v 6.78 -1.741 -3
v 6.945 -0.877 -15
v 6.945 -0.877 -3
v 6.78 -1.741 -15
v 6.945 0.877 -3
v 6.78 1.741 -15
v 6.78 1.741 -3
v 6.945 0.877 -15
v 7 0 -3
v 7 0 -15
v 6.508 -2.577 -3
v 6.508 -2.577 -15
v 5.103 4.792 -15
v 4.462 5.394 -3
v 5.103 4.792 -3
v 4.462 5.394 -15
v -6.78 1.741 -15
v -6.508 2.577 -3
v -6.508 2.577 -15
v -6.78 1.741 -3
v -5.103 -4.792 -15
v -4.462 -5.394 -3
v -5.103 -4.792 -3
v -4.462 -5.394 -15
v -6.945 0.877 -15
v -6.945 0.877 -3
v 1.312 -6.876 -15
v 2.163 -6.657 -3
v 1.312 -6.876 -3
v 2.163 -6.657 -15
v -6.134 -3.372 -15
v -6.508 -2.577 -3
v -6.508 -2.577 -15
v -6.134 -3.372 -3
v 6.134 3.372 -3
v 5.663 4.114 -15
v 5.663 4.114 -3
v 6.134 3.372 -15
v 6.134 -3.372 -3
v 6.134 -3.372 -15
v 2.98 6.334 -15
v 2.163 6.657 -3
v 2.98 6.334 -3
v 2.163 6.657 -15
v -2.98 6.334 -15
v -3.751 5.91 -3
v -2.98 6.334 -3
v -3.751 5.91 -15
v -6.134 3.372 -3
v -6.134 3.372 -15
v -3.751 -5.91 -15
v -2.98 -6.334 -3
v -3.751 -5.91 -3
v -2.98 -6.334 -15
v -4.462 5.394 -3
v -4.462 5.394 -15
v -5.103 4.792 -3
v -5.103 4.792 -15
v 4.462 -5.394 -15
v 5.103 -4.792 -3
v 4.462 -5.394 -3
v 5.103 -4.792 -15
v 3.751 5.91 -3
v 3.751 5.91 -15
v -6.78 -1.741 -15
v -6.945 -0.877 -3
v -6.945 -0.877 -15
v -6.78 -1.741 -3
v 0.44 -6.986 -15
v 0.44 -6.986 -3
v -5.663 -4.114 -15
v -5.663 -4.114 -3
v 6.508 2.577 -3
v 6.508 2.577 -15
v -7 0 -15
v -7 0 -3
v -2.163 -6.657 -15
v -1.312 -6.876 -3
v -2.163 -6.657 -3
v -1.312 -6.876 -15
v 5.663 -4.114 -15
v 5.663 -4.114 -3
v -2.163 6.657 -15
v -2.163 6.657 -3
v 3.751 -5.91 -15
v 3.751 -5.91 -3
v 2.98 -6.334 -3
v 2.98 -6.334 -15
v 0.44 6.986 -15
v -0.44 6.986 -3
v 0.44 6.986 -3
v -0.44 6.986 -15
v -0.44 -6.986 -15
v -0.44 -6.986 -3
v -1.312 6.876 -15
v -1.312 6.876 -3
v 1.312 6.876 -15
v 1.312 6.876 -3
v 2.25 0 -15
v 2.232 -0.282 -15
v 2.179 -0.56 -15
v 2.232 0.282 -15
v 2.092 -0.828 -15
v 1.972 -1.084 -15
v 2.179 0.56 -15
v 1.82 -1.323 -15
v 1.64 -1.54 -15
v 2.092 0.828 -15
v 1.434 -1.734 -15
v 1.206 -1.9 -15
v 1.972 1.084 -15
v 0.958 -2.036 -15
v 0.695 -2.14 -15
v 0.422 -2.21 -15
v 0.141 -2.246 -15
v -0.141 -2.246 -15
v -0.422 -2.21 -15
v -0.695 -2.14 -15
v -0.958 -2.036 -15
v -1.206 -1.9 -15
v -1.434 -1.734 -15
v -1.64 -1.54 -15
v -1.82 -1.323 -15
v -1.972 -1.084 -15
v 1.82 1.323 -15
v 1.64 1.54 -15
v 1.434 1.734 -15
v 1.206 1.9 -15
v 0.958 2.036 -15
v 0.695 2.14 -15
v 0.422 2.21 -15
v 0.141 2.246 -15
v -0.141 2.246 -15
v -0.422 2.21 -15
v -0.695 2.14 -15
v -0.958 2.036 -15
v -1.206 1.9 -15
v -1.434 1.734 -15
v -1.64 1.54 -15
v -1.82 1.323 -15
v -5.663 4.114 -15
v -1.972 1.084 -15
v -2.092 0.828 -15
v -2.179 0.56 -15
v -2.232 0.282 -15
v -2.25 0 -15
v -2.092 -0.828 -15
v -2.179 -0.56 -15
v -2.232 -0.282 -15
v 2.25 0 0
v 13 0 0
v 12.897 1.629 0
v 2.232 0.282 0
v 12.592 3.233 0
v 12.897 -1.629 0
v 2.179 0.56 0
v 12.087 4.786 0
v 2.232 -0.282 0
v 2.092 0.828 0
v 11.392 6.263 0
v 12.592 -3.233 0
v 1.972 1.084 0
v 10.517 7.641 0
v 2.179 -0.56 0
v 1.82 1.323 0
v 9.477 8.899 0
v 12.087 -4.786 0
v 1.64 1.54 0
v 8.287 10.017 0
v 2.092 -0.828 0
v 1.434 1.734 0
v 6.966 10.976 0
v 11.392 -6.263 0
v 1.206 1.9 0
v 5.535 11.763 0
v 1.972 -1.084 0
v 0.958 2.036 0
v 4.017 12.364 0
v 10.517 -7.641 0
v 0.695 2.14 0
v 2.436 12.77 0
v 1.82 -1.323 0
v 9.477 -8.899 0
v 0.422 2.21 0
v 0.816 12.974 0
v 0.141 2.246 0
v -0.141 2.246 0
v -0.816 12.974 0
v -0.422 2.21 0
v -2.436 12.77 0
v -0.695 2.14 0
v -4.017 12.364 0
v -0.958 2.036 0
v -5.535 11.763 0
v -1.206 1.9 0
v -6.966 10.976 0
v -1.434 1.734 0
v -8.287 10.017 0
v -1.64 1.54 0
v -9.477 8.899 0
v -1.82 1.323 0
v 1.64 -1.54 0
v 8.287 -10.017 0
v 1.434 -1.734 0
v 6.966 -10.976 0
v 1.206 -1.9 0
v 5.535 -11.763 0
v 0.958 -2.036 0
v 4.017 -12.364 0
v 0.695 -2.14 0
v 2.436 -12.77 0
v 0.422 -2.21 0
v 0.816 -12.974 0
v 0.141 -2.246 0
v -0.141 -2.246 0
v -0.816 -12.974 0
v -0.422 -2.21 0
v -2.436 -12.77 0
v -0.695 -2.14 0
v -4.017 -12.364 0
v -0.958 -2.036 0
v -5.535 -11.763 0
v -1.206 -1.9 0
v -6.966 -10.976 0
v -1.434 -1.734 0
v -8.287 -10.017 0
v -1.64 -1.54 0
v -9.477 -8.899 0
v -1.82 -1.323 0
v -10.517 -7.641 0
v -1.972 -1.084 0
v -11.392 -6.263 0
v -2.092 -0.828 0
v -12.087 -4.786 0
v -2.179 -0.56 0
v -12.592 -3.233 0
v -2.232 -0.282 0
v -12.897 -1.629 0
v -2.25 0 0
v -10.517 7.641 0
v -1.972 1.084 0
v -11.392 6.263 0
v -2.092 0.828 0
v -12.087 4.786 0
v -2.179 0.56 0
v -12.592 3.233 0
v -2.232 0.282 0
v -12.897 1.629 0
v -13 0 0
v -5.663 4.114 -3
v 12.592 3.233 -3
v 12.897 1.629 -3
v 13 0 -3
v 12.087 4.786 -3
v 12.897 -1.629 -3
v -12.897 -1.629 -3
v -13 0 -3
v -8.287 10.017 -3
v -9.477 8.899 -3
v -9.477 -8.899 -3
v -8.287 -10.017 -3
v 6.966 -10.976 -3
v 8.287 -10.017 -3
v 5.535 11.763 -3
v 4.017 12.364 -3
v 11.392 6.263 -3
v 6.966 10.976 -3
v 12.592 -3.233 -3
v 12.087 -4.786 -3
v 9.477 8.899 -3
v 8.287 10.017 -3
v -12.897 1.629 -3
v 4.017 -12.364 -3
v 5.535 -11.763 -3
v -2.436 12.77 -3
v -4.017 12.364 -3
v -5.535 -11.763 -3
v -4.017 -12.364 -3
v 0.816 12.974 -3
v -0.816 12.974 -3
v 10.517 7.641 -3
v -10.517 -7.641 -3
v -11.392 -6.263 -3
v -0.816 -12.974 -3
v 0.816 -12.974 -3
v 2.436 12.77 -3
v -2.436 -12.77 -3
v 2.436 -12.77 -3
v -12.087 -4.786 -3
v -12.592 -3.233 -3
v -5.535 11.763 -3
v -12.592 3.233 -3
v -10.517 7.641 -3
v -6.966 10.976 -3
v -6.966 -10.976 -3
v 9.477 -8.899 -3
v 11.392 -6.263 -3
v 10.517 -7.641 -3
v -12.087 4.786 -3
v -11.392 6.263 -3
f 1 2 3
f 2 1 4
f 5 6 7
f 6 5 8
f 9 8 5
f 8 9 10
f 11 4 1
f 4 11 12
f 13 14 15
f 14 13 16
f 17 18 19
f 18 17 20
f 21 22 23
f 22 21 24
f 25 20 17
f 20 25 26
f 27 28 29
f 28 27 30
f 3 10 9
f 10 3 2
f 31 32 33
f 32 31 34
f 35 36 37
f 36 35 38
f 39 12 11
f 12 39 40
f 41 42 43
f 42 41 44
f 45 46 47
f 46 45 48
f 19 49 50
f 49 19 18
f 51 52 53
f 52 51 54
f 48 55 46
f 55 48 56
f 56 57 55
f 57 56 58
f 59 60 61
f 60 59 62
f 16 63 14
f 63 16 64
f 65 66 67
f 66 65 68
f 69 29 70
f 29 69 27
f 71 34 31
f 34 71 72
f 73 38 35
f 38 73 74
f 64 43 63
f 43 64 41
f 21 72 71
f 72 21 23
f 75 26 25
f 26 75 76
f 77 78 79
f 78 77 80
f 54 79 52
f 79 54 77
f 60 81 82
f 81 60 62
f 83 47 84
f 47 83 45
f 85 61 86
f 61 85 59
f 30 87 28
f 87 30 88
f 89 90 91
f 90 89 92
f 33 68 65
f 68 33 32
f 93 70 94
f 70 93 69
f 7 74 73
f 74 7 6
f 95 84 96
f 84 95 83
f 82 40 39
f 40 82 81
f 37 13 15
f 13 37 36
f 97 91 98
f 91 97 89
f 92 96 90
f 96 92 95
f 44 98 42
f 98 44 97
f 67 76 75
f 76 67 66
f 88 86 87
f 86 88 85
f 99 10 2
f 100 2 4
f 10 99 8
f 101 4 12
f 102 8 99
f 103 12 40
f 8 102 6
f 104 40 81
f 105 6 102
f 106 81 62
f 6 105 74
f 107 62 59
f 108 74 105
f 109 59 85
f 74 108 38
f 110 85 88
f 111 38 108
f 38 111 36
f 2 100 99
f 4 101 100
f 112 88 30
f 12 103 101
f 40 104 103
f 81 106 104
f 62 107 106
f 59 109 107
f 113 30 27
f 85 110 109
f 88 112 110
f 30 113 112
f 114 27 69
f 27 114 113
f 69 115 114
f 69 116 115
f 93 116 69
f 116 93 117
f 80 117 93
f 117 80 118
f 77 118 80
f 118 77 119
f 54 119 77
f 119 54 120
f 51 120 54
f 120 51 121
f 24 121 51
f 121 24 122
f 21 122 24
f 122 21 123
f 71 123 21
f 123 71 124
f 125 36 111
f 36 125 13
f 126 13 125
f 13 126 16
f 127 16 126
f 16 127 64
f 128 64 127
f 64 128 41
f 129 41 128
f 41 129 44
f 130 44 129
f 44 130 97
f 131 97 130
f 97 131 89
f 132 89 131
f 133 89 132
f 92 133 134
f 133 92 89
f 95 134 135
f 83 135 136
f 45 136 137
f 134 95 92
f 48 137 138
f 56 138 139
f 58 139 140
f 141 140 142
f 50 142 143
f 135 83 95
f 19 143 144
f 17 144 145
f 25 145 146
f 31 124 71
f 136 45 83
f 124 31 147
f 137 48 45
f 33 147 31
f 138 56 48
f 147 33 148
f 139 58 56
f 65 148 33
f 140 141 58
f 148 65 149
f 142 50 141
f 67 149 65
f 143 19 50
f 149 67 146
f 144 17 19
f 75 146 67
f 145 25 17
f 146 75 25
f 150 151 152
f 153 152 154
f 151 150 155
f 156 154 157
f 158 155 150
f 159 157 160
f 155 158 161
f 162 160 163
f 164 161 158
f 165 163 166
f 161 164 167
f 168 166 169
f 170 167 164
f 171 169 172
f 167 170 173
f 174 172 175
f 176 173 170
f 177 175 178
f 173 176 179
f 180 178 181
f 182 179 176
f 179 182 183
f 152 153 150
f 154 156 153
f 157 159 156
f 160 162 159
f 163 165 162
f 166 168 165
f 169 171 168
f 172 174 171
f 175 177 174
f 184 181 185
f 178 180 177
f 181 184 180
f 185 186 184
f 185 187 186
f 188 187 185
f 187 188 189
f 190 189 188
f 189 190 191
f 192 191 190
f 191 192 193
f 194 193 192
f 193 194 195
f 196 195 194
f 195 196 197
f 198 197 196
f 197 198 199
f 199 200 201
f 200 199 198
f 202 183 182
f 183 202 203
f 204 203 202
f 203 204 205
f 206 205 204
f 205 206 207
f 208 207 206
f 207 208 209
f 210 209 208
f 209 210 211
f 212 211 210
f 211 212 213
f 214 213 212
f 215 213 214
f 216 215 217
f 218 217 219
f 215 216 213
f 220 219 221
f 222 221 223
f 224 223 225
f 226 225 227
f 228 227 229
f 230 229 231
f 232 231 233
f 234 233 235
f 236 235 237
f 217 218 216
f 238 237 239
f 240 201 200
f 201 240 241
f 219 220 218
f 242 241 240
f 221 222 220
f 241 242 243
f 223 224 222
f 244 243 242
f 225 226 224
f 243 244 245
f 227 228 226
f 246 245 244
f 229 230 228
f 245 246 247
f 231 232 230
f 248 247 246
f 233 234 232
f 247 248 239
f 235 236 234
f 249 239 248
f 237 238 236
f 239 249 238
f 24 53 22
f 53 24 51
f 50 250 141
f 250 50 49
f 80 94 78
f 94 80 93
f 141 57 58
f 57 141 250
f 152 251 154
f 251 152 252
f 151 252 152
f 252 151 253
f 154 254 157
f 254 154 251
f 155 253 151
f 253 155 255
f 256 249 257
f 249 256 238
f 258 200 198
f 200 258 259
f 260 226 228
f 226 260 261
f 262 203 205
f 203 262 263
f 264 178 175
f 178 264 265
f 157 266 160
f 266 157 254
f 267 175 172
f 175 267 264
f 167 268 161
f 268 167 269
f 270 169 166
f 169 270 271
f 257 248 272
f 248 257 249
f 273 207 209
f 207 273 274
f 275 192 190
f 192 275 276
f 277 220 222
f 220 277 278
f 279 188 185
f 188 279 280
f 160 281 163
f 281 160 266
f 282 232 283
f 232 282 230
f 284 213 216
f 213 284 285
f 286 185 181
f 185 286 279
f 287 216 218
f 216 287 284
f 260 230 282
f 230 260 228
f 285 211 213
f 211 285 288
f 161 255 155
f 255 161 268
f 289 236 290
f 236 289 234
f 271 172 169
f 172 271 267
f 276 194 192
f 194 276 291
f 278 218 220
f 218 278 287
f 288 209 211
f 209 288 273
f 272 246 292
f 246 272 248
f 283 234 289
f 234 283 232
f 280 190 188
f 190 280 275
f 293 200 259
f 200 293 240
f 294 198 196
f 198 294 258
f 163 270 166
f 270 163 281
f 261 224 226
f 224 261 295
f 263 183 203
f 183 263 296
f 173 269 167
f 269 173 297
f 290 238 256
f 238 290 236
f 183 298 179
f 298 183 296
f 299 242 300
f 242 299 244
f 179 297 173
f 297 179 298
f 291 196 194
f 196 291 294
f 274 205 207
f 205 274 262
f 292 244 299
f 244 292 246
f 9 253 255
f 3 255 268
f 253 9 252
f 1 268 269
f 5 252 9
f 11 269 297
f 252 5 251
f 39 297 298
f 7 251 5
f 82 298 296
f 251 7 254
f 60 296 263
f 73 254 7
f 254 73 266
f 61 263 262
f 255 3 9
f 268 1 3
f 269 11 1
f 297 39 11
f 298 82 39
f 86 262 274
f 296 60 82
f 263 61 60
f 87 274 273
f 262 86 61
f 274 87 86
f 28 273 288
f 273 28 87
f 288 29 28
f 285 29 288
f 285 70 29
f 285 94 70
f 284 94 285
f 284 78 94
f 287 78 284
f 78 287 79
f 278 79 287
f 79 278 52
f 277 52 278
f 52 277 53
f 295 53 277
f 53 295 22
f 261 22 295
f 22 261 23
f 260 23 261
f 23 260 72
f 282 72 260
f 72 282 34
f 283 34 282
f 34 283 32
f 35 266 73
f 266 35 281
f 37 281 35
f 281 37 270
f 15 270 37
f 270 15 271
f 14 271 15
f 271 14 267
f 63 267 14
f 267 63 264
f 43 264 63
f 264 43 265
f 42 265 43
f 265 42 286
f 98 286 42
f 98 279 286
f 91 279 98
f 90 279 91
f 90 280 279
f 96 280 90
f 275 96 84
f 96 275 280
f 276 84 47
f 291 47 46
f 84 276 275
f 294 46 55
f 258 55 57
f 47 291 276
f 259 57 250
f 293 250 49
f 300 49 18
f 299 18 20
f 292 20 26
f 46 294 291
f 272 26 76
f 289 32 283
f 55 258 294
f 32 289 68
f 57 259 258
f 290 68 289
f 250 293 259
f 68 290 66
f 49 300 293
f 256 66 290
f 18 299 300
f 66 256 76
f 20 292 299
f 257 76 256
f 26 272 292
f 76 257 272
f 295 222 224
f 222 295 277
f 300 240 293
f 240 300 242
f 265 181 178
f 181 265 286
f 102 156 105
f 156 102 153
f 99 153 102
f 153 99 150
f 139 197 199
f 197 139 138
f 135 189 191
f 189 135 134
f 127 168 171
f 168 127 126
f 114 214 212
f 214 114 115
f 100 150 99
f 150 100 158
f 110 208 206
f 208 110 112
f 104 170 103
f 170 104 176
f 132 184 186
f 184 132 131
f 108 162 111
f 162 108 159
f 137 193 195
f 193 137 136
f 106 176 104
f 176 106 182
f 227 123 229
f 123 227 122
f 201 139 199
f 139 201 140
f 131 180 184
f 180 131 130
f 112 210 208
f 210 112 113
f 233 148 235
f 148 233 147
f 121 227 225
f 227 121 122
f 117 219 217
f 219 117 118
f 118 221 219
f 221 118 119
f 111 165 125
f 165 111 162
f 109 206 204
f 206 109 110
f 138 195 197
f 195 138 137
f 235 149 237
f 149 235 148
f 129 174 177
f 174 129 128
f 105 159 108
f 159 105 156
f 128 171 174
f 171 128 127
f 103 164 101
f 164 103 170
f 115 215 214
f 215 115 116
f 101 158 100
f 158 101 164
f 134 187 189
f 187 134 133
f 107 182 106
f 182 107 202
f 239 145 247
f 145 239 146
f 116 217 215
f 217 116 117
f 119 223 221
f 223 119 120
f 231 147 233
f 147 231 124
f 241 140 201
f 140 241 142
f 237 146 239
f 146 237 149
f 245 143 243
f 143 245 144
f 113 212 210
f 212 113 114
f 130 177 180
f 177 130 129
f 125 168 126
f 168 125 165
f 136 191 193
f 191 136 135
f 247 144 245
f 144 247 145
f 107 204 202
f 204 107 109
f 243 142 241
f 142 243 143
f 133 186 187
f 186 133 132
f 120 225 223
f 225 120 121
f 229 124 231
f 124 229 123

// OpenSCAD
$fn = 50;


difference() {
	union() {
		translate(v = [0, 0, -15.0000000000]) {
			cylinder(h = 15, r = 7.0000000000);
		}
		translate(v = [0, 0, -3.0000000000]) {
			cylinder(h = 3, r = 13.0000000000);
		}
	}
	union() {
		#translate(v = [0, 0, -15]) {
			cylinder(h = 15, r = 2.2500000000);
		}
	}
}
